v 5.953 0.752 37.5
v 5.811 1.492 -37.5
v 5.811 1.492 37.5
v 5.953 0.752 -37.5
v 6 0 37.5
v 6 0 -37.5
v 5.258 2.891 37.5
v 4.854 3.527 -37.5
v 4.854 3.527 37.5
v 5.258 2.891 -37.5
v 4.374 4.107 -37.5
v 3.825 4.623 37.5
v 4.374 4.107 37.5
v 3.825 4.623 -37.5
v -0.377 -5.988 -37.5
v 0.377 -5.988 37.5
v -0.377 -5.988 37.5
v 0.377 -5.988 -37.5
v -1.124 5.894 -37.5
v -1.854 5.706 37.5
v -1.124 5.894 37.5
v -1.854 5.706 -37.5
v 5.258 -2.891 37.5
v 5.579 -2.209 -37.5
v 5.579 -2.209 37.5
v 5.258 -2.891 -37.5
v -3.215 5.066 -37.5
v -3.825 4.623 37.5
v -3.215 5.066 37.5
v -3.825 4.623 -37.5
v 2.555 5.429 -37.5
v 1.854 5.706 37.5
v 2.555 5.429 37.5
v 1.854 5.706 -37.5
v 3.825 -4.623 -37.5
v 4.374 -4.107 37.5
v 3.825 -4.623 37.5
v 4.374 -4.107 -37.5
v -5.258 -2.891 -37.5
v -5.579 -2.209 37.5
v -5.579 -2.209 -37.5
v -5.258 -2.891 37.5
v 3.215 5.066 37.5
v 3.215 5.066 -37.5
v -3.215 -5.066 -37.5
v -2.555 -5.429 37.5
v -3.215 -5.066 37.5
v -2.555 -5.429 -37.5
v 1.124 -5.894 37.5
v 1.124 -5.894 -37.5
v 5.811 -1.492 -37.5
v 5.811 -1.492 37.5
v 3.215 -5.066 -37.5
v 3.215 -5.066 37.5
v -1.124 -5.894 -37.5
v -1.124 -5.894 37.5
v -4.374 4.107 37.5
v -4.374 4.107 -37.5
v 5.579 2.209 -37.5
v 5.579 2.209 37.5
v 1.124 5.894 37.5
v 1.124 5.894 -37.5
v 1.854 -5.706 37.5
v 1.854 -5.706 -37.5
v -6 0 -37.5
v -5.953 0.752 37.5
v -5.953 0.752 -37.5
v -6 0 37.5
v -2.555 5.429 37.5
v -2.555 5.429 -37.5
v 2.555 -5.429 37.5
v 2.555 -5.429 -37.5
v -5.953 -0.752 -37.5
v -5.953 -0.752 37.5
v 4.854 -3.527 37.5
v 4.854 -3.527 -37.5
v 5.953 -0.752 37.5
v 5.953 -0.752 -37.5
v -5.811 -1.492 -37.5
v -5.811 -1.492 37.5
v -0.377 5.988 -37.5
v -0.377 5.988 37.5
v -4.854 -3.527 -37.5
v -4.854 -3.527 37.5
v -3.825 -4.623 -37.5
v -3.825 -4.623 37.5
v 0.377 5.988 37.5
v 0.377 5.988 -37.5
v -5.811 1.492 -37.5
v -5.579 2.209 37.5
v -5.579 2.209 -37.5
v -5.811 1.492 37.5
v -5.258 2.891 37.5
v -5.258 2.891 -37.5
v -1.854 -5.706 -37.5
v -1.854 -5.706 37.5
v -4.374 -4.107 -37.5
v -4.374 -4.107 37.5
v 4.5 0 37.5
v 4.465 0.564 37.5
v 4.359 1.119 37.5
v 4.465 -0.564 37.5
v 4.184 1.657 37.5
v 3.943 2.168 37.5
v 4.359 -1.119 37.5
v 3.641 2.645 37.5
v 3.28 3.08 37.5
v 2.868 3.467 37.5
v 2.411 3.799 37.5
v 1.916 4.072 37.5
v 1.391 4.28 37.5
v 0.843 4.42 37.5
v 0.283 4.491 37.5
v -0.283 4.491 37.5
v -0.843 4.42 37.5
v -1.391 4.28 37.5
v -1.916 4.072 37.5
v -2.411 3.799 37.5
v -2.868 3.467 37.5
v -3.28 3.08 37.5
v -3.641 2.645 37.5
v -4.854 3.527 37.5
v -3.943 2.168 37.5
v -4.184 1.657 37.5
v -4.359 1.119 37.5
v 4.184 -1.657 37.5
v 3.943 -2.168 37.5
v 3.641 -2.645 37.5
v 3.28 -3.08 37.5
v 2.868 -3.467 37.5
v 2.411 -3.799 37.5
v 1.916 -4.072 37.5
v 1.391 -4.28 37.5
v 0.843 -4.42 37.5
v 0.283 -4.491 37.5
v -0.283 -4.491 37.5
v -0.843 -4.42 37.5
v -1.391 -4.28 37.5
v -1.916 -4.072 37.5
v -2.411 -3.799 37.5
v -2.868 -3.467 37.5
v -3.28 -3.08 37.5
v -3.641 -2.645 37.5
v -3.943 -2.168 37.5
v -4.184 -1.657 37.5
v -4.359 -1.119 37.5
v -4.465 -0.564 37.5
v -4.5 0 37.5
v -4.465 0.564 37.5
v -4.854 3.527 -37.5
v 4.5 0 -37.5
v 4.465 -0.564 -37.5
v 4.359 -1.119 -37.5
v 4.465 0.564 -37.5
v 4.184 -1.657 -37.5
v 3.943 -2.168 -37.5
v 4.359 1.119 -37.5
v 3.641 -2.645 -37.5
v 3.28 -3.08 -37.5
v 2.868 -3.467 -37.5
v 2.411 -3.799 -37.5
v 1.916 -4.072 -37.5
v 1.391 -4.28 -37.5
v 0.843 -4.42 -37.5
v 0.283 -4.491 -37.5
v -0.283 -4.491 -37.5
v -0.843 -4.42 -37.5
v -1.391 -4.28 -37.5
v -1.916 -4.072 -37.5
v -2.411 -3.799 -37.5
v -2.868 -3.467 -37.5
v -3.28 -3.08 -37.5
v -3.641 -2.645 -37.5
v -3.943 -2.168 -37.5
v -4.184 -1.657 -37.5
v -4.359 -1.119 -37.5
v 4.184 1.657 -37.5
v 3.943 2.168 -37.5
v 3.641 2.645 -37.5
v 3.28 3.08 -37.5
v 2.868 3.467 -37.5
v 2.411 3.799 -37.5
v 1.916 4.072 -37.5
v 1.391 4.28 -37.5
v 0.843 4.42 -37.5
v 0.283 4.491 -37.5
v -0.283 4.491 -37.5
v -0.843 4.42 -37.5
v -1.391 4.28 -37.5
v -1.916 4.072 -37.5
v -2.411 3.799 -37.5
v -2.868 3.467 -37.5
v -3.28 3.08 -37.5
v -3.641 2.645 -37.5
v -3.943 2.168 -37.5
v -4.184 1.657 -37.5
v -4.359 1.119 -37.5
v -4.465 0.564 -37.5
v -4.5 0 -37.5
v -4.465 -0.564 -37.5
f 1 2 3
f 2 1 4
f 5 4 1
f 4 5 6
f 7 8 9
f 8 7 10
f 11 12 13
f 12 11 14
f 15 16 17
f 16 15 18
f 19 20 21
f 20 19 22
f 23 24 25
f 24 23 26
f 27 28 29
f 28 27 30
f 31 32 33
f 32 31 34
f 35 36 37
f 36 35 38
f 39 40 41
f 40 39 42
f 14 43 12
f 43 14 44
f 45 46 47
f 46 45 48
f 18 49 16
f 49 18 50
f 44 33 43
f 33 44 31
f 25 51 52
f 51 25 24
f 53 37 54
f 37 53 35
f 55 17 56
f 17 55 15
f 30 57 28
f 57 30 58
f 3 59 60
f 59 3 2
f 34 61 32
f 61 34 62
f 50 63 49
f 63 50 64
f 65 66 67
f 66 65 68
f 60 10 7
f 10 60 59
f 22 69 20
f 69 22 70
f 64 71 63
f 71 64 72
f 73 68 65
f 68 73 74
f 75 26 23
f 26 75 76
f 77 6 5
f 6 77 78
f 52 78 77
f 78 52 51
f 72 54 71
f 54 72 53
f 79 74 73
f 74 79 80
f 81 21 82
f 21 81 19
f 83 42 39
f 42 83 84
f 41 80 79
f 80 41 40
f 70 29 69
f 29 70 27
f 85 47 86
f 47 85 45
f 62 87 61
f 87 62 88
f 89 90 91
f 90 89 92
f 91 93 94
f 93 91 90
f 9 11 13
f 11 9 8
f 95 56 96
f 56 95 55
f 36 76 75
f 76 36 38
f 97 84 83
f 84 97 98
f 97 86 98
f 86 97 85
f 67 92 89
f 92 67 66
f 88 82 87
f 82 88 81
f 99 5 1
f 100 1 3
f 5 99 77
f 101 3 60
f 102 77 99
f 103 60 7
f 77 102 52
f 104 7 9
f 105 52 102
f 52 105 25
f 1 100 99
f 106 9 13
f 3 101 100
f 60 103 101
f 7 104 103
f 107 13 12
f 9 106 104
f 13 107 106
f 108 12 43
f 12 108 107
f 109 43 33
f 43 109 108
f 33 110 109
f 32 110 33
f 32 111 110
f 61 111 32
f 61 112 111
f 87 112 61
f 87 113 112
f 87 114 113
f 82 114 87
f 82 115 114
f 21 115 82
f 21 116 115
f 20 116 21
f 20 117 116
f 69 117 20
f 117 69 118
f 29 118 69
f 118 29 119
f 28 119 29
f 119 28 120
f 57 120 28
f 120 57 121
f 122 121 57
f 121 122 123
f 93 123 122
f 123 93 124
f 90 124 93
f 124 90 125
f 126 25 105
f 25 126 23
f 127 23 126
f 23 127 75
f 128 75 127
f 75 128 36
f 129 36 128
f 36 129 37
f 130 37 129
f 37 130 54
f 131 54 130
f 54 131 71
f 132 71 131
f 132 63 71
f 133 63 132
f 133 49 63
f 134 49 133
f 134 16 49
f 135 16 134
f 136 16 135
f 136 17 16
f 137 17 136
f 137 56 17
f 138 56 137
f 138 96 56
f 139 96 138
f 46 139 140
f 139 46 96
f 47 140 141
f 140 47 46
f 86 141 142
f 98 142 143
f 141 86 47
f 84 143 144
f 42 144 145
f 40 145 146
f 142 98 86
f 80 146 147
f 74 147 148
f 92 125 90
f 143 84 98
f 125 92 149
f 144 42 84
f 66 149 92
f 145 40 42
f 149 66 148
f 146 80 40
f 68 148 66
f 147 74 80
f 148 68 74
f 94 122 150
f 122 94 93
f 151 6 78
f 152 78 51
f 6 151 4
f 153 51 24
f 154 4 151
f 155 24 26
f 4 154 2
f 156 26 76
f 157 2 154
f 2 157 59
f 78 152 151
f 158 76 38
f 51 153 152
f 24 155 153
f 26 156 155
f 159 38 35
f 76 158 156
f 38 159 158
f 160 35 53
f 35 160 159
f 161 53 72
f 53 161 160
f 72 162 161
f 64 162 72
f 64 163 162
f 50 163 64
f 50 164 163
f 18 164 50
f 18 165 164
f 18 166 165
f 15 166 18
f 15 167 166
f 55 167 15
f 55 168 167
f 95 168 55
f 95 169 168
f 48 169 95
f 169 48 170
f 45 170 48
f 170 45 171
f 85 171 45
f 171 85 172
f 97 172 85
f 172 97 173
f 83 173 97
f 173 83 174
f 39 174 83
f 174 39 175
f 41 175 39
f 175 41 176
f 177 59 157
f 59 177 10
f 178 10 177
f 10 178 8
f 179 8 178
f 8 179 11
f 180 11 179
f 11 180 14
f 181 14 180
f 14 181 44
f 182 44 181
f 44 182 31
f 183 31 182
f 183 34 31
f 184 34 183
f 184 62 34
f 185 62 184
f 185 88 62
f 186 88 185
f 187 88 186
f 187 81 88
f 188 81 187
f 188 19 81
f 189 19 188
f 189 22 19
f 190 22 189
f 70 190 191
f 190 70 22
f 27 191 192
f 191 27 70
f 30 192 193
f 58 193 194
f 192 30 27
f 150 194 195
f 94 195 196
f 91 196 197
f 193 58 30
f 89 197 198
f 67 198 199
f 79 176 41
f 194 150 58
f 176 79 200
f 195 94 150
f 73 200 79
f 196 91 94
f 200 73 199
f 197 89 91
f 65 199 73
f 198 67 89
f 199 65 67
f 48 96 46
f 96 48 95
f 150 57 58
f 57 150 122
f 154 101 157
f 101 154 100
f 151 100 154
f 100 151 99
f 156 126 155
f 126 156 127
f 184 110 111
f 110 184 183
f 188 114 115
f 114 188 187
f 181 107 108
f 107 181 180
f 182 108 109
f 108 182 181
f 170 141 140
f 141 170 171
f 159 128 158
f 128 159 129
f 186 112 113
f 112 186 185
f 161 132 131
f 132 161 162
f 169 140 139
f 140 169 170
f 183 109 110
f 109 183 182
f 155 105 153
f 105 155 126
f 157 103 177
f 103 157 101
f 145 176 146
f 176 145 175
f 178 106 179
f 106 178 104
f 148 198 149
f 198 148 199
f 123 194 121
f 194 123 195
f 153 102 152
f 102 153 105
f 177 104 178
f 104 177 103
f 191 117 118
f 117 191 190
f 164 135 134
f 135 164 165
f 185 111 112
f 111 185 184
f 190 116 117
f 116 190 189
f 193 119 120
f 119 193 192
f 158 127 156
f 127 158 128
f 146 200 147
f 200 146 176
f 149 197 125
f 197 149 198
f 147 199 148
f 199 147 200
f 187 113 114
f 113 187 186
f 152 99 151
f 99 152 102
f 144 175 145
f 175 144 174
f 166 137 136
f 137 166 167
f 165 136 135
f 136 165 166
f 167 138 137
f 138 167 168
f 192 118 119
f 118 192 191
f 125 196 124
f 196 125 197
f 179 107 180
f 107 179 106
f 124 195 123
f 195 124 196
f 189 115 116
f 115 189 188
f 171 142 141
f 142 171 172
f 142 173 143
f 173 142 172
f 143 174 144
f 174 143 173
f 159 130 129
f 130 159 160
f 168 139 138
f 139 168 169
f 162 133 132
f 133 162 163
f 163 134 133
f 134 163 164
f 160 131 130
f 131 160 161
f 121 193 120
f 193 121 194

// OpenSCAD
$fn = 50;


difference() {
	union() {
		translate(v = [0, 0, -37.5000000000]) {
			cylinder(h = 75, r = 6.0000000000);
		}
	}
	union() {
		translate(v = [0, 0, -100.0000000000]) {
			cylinder(h = 200, r = 4.5000000000);
		}
	}
}
